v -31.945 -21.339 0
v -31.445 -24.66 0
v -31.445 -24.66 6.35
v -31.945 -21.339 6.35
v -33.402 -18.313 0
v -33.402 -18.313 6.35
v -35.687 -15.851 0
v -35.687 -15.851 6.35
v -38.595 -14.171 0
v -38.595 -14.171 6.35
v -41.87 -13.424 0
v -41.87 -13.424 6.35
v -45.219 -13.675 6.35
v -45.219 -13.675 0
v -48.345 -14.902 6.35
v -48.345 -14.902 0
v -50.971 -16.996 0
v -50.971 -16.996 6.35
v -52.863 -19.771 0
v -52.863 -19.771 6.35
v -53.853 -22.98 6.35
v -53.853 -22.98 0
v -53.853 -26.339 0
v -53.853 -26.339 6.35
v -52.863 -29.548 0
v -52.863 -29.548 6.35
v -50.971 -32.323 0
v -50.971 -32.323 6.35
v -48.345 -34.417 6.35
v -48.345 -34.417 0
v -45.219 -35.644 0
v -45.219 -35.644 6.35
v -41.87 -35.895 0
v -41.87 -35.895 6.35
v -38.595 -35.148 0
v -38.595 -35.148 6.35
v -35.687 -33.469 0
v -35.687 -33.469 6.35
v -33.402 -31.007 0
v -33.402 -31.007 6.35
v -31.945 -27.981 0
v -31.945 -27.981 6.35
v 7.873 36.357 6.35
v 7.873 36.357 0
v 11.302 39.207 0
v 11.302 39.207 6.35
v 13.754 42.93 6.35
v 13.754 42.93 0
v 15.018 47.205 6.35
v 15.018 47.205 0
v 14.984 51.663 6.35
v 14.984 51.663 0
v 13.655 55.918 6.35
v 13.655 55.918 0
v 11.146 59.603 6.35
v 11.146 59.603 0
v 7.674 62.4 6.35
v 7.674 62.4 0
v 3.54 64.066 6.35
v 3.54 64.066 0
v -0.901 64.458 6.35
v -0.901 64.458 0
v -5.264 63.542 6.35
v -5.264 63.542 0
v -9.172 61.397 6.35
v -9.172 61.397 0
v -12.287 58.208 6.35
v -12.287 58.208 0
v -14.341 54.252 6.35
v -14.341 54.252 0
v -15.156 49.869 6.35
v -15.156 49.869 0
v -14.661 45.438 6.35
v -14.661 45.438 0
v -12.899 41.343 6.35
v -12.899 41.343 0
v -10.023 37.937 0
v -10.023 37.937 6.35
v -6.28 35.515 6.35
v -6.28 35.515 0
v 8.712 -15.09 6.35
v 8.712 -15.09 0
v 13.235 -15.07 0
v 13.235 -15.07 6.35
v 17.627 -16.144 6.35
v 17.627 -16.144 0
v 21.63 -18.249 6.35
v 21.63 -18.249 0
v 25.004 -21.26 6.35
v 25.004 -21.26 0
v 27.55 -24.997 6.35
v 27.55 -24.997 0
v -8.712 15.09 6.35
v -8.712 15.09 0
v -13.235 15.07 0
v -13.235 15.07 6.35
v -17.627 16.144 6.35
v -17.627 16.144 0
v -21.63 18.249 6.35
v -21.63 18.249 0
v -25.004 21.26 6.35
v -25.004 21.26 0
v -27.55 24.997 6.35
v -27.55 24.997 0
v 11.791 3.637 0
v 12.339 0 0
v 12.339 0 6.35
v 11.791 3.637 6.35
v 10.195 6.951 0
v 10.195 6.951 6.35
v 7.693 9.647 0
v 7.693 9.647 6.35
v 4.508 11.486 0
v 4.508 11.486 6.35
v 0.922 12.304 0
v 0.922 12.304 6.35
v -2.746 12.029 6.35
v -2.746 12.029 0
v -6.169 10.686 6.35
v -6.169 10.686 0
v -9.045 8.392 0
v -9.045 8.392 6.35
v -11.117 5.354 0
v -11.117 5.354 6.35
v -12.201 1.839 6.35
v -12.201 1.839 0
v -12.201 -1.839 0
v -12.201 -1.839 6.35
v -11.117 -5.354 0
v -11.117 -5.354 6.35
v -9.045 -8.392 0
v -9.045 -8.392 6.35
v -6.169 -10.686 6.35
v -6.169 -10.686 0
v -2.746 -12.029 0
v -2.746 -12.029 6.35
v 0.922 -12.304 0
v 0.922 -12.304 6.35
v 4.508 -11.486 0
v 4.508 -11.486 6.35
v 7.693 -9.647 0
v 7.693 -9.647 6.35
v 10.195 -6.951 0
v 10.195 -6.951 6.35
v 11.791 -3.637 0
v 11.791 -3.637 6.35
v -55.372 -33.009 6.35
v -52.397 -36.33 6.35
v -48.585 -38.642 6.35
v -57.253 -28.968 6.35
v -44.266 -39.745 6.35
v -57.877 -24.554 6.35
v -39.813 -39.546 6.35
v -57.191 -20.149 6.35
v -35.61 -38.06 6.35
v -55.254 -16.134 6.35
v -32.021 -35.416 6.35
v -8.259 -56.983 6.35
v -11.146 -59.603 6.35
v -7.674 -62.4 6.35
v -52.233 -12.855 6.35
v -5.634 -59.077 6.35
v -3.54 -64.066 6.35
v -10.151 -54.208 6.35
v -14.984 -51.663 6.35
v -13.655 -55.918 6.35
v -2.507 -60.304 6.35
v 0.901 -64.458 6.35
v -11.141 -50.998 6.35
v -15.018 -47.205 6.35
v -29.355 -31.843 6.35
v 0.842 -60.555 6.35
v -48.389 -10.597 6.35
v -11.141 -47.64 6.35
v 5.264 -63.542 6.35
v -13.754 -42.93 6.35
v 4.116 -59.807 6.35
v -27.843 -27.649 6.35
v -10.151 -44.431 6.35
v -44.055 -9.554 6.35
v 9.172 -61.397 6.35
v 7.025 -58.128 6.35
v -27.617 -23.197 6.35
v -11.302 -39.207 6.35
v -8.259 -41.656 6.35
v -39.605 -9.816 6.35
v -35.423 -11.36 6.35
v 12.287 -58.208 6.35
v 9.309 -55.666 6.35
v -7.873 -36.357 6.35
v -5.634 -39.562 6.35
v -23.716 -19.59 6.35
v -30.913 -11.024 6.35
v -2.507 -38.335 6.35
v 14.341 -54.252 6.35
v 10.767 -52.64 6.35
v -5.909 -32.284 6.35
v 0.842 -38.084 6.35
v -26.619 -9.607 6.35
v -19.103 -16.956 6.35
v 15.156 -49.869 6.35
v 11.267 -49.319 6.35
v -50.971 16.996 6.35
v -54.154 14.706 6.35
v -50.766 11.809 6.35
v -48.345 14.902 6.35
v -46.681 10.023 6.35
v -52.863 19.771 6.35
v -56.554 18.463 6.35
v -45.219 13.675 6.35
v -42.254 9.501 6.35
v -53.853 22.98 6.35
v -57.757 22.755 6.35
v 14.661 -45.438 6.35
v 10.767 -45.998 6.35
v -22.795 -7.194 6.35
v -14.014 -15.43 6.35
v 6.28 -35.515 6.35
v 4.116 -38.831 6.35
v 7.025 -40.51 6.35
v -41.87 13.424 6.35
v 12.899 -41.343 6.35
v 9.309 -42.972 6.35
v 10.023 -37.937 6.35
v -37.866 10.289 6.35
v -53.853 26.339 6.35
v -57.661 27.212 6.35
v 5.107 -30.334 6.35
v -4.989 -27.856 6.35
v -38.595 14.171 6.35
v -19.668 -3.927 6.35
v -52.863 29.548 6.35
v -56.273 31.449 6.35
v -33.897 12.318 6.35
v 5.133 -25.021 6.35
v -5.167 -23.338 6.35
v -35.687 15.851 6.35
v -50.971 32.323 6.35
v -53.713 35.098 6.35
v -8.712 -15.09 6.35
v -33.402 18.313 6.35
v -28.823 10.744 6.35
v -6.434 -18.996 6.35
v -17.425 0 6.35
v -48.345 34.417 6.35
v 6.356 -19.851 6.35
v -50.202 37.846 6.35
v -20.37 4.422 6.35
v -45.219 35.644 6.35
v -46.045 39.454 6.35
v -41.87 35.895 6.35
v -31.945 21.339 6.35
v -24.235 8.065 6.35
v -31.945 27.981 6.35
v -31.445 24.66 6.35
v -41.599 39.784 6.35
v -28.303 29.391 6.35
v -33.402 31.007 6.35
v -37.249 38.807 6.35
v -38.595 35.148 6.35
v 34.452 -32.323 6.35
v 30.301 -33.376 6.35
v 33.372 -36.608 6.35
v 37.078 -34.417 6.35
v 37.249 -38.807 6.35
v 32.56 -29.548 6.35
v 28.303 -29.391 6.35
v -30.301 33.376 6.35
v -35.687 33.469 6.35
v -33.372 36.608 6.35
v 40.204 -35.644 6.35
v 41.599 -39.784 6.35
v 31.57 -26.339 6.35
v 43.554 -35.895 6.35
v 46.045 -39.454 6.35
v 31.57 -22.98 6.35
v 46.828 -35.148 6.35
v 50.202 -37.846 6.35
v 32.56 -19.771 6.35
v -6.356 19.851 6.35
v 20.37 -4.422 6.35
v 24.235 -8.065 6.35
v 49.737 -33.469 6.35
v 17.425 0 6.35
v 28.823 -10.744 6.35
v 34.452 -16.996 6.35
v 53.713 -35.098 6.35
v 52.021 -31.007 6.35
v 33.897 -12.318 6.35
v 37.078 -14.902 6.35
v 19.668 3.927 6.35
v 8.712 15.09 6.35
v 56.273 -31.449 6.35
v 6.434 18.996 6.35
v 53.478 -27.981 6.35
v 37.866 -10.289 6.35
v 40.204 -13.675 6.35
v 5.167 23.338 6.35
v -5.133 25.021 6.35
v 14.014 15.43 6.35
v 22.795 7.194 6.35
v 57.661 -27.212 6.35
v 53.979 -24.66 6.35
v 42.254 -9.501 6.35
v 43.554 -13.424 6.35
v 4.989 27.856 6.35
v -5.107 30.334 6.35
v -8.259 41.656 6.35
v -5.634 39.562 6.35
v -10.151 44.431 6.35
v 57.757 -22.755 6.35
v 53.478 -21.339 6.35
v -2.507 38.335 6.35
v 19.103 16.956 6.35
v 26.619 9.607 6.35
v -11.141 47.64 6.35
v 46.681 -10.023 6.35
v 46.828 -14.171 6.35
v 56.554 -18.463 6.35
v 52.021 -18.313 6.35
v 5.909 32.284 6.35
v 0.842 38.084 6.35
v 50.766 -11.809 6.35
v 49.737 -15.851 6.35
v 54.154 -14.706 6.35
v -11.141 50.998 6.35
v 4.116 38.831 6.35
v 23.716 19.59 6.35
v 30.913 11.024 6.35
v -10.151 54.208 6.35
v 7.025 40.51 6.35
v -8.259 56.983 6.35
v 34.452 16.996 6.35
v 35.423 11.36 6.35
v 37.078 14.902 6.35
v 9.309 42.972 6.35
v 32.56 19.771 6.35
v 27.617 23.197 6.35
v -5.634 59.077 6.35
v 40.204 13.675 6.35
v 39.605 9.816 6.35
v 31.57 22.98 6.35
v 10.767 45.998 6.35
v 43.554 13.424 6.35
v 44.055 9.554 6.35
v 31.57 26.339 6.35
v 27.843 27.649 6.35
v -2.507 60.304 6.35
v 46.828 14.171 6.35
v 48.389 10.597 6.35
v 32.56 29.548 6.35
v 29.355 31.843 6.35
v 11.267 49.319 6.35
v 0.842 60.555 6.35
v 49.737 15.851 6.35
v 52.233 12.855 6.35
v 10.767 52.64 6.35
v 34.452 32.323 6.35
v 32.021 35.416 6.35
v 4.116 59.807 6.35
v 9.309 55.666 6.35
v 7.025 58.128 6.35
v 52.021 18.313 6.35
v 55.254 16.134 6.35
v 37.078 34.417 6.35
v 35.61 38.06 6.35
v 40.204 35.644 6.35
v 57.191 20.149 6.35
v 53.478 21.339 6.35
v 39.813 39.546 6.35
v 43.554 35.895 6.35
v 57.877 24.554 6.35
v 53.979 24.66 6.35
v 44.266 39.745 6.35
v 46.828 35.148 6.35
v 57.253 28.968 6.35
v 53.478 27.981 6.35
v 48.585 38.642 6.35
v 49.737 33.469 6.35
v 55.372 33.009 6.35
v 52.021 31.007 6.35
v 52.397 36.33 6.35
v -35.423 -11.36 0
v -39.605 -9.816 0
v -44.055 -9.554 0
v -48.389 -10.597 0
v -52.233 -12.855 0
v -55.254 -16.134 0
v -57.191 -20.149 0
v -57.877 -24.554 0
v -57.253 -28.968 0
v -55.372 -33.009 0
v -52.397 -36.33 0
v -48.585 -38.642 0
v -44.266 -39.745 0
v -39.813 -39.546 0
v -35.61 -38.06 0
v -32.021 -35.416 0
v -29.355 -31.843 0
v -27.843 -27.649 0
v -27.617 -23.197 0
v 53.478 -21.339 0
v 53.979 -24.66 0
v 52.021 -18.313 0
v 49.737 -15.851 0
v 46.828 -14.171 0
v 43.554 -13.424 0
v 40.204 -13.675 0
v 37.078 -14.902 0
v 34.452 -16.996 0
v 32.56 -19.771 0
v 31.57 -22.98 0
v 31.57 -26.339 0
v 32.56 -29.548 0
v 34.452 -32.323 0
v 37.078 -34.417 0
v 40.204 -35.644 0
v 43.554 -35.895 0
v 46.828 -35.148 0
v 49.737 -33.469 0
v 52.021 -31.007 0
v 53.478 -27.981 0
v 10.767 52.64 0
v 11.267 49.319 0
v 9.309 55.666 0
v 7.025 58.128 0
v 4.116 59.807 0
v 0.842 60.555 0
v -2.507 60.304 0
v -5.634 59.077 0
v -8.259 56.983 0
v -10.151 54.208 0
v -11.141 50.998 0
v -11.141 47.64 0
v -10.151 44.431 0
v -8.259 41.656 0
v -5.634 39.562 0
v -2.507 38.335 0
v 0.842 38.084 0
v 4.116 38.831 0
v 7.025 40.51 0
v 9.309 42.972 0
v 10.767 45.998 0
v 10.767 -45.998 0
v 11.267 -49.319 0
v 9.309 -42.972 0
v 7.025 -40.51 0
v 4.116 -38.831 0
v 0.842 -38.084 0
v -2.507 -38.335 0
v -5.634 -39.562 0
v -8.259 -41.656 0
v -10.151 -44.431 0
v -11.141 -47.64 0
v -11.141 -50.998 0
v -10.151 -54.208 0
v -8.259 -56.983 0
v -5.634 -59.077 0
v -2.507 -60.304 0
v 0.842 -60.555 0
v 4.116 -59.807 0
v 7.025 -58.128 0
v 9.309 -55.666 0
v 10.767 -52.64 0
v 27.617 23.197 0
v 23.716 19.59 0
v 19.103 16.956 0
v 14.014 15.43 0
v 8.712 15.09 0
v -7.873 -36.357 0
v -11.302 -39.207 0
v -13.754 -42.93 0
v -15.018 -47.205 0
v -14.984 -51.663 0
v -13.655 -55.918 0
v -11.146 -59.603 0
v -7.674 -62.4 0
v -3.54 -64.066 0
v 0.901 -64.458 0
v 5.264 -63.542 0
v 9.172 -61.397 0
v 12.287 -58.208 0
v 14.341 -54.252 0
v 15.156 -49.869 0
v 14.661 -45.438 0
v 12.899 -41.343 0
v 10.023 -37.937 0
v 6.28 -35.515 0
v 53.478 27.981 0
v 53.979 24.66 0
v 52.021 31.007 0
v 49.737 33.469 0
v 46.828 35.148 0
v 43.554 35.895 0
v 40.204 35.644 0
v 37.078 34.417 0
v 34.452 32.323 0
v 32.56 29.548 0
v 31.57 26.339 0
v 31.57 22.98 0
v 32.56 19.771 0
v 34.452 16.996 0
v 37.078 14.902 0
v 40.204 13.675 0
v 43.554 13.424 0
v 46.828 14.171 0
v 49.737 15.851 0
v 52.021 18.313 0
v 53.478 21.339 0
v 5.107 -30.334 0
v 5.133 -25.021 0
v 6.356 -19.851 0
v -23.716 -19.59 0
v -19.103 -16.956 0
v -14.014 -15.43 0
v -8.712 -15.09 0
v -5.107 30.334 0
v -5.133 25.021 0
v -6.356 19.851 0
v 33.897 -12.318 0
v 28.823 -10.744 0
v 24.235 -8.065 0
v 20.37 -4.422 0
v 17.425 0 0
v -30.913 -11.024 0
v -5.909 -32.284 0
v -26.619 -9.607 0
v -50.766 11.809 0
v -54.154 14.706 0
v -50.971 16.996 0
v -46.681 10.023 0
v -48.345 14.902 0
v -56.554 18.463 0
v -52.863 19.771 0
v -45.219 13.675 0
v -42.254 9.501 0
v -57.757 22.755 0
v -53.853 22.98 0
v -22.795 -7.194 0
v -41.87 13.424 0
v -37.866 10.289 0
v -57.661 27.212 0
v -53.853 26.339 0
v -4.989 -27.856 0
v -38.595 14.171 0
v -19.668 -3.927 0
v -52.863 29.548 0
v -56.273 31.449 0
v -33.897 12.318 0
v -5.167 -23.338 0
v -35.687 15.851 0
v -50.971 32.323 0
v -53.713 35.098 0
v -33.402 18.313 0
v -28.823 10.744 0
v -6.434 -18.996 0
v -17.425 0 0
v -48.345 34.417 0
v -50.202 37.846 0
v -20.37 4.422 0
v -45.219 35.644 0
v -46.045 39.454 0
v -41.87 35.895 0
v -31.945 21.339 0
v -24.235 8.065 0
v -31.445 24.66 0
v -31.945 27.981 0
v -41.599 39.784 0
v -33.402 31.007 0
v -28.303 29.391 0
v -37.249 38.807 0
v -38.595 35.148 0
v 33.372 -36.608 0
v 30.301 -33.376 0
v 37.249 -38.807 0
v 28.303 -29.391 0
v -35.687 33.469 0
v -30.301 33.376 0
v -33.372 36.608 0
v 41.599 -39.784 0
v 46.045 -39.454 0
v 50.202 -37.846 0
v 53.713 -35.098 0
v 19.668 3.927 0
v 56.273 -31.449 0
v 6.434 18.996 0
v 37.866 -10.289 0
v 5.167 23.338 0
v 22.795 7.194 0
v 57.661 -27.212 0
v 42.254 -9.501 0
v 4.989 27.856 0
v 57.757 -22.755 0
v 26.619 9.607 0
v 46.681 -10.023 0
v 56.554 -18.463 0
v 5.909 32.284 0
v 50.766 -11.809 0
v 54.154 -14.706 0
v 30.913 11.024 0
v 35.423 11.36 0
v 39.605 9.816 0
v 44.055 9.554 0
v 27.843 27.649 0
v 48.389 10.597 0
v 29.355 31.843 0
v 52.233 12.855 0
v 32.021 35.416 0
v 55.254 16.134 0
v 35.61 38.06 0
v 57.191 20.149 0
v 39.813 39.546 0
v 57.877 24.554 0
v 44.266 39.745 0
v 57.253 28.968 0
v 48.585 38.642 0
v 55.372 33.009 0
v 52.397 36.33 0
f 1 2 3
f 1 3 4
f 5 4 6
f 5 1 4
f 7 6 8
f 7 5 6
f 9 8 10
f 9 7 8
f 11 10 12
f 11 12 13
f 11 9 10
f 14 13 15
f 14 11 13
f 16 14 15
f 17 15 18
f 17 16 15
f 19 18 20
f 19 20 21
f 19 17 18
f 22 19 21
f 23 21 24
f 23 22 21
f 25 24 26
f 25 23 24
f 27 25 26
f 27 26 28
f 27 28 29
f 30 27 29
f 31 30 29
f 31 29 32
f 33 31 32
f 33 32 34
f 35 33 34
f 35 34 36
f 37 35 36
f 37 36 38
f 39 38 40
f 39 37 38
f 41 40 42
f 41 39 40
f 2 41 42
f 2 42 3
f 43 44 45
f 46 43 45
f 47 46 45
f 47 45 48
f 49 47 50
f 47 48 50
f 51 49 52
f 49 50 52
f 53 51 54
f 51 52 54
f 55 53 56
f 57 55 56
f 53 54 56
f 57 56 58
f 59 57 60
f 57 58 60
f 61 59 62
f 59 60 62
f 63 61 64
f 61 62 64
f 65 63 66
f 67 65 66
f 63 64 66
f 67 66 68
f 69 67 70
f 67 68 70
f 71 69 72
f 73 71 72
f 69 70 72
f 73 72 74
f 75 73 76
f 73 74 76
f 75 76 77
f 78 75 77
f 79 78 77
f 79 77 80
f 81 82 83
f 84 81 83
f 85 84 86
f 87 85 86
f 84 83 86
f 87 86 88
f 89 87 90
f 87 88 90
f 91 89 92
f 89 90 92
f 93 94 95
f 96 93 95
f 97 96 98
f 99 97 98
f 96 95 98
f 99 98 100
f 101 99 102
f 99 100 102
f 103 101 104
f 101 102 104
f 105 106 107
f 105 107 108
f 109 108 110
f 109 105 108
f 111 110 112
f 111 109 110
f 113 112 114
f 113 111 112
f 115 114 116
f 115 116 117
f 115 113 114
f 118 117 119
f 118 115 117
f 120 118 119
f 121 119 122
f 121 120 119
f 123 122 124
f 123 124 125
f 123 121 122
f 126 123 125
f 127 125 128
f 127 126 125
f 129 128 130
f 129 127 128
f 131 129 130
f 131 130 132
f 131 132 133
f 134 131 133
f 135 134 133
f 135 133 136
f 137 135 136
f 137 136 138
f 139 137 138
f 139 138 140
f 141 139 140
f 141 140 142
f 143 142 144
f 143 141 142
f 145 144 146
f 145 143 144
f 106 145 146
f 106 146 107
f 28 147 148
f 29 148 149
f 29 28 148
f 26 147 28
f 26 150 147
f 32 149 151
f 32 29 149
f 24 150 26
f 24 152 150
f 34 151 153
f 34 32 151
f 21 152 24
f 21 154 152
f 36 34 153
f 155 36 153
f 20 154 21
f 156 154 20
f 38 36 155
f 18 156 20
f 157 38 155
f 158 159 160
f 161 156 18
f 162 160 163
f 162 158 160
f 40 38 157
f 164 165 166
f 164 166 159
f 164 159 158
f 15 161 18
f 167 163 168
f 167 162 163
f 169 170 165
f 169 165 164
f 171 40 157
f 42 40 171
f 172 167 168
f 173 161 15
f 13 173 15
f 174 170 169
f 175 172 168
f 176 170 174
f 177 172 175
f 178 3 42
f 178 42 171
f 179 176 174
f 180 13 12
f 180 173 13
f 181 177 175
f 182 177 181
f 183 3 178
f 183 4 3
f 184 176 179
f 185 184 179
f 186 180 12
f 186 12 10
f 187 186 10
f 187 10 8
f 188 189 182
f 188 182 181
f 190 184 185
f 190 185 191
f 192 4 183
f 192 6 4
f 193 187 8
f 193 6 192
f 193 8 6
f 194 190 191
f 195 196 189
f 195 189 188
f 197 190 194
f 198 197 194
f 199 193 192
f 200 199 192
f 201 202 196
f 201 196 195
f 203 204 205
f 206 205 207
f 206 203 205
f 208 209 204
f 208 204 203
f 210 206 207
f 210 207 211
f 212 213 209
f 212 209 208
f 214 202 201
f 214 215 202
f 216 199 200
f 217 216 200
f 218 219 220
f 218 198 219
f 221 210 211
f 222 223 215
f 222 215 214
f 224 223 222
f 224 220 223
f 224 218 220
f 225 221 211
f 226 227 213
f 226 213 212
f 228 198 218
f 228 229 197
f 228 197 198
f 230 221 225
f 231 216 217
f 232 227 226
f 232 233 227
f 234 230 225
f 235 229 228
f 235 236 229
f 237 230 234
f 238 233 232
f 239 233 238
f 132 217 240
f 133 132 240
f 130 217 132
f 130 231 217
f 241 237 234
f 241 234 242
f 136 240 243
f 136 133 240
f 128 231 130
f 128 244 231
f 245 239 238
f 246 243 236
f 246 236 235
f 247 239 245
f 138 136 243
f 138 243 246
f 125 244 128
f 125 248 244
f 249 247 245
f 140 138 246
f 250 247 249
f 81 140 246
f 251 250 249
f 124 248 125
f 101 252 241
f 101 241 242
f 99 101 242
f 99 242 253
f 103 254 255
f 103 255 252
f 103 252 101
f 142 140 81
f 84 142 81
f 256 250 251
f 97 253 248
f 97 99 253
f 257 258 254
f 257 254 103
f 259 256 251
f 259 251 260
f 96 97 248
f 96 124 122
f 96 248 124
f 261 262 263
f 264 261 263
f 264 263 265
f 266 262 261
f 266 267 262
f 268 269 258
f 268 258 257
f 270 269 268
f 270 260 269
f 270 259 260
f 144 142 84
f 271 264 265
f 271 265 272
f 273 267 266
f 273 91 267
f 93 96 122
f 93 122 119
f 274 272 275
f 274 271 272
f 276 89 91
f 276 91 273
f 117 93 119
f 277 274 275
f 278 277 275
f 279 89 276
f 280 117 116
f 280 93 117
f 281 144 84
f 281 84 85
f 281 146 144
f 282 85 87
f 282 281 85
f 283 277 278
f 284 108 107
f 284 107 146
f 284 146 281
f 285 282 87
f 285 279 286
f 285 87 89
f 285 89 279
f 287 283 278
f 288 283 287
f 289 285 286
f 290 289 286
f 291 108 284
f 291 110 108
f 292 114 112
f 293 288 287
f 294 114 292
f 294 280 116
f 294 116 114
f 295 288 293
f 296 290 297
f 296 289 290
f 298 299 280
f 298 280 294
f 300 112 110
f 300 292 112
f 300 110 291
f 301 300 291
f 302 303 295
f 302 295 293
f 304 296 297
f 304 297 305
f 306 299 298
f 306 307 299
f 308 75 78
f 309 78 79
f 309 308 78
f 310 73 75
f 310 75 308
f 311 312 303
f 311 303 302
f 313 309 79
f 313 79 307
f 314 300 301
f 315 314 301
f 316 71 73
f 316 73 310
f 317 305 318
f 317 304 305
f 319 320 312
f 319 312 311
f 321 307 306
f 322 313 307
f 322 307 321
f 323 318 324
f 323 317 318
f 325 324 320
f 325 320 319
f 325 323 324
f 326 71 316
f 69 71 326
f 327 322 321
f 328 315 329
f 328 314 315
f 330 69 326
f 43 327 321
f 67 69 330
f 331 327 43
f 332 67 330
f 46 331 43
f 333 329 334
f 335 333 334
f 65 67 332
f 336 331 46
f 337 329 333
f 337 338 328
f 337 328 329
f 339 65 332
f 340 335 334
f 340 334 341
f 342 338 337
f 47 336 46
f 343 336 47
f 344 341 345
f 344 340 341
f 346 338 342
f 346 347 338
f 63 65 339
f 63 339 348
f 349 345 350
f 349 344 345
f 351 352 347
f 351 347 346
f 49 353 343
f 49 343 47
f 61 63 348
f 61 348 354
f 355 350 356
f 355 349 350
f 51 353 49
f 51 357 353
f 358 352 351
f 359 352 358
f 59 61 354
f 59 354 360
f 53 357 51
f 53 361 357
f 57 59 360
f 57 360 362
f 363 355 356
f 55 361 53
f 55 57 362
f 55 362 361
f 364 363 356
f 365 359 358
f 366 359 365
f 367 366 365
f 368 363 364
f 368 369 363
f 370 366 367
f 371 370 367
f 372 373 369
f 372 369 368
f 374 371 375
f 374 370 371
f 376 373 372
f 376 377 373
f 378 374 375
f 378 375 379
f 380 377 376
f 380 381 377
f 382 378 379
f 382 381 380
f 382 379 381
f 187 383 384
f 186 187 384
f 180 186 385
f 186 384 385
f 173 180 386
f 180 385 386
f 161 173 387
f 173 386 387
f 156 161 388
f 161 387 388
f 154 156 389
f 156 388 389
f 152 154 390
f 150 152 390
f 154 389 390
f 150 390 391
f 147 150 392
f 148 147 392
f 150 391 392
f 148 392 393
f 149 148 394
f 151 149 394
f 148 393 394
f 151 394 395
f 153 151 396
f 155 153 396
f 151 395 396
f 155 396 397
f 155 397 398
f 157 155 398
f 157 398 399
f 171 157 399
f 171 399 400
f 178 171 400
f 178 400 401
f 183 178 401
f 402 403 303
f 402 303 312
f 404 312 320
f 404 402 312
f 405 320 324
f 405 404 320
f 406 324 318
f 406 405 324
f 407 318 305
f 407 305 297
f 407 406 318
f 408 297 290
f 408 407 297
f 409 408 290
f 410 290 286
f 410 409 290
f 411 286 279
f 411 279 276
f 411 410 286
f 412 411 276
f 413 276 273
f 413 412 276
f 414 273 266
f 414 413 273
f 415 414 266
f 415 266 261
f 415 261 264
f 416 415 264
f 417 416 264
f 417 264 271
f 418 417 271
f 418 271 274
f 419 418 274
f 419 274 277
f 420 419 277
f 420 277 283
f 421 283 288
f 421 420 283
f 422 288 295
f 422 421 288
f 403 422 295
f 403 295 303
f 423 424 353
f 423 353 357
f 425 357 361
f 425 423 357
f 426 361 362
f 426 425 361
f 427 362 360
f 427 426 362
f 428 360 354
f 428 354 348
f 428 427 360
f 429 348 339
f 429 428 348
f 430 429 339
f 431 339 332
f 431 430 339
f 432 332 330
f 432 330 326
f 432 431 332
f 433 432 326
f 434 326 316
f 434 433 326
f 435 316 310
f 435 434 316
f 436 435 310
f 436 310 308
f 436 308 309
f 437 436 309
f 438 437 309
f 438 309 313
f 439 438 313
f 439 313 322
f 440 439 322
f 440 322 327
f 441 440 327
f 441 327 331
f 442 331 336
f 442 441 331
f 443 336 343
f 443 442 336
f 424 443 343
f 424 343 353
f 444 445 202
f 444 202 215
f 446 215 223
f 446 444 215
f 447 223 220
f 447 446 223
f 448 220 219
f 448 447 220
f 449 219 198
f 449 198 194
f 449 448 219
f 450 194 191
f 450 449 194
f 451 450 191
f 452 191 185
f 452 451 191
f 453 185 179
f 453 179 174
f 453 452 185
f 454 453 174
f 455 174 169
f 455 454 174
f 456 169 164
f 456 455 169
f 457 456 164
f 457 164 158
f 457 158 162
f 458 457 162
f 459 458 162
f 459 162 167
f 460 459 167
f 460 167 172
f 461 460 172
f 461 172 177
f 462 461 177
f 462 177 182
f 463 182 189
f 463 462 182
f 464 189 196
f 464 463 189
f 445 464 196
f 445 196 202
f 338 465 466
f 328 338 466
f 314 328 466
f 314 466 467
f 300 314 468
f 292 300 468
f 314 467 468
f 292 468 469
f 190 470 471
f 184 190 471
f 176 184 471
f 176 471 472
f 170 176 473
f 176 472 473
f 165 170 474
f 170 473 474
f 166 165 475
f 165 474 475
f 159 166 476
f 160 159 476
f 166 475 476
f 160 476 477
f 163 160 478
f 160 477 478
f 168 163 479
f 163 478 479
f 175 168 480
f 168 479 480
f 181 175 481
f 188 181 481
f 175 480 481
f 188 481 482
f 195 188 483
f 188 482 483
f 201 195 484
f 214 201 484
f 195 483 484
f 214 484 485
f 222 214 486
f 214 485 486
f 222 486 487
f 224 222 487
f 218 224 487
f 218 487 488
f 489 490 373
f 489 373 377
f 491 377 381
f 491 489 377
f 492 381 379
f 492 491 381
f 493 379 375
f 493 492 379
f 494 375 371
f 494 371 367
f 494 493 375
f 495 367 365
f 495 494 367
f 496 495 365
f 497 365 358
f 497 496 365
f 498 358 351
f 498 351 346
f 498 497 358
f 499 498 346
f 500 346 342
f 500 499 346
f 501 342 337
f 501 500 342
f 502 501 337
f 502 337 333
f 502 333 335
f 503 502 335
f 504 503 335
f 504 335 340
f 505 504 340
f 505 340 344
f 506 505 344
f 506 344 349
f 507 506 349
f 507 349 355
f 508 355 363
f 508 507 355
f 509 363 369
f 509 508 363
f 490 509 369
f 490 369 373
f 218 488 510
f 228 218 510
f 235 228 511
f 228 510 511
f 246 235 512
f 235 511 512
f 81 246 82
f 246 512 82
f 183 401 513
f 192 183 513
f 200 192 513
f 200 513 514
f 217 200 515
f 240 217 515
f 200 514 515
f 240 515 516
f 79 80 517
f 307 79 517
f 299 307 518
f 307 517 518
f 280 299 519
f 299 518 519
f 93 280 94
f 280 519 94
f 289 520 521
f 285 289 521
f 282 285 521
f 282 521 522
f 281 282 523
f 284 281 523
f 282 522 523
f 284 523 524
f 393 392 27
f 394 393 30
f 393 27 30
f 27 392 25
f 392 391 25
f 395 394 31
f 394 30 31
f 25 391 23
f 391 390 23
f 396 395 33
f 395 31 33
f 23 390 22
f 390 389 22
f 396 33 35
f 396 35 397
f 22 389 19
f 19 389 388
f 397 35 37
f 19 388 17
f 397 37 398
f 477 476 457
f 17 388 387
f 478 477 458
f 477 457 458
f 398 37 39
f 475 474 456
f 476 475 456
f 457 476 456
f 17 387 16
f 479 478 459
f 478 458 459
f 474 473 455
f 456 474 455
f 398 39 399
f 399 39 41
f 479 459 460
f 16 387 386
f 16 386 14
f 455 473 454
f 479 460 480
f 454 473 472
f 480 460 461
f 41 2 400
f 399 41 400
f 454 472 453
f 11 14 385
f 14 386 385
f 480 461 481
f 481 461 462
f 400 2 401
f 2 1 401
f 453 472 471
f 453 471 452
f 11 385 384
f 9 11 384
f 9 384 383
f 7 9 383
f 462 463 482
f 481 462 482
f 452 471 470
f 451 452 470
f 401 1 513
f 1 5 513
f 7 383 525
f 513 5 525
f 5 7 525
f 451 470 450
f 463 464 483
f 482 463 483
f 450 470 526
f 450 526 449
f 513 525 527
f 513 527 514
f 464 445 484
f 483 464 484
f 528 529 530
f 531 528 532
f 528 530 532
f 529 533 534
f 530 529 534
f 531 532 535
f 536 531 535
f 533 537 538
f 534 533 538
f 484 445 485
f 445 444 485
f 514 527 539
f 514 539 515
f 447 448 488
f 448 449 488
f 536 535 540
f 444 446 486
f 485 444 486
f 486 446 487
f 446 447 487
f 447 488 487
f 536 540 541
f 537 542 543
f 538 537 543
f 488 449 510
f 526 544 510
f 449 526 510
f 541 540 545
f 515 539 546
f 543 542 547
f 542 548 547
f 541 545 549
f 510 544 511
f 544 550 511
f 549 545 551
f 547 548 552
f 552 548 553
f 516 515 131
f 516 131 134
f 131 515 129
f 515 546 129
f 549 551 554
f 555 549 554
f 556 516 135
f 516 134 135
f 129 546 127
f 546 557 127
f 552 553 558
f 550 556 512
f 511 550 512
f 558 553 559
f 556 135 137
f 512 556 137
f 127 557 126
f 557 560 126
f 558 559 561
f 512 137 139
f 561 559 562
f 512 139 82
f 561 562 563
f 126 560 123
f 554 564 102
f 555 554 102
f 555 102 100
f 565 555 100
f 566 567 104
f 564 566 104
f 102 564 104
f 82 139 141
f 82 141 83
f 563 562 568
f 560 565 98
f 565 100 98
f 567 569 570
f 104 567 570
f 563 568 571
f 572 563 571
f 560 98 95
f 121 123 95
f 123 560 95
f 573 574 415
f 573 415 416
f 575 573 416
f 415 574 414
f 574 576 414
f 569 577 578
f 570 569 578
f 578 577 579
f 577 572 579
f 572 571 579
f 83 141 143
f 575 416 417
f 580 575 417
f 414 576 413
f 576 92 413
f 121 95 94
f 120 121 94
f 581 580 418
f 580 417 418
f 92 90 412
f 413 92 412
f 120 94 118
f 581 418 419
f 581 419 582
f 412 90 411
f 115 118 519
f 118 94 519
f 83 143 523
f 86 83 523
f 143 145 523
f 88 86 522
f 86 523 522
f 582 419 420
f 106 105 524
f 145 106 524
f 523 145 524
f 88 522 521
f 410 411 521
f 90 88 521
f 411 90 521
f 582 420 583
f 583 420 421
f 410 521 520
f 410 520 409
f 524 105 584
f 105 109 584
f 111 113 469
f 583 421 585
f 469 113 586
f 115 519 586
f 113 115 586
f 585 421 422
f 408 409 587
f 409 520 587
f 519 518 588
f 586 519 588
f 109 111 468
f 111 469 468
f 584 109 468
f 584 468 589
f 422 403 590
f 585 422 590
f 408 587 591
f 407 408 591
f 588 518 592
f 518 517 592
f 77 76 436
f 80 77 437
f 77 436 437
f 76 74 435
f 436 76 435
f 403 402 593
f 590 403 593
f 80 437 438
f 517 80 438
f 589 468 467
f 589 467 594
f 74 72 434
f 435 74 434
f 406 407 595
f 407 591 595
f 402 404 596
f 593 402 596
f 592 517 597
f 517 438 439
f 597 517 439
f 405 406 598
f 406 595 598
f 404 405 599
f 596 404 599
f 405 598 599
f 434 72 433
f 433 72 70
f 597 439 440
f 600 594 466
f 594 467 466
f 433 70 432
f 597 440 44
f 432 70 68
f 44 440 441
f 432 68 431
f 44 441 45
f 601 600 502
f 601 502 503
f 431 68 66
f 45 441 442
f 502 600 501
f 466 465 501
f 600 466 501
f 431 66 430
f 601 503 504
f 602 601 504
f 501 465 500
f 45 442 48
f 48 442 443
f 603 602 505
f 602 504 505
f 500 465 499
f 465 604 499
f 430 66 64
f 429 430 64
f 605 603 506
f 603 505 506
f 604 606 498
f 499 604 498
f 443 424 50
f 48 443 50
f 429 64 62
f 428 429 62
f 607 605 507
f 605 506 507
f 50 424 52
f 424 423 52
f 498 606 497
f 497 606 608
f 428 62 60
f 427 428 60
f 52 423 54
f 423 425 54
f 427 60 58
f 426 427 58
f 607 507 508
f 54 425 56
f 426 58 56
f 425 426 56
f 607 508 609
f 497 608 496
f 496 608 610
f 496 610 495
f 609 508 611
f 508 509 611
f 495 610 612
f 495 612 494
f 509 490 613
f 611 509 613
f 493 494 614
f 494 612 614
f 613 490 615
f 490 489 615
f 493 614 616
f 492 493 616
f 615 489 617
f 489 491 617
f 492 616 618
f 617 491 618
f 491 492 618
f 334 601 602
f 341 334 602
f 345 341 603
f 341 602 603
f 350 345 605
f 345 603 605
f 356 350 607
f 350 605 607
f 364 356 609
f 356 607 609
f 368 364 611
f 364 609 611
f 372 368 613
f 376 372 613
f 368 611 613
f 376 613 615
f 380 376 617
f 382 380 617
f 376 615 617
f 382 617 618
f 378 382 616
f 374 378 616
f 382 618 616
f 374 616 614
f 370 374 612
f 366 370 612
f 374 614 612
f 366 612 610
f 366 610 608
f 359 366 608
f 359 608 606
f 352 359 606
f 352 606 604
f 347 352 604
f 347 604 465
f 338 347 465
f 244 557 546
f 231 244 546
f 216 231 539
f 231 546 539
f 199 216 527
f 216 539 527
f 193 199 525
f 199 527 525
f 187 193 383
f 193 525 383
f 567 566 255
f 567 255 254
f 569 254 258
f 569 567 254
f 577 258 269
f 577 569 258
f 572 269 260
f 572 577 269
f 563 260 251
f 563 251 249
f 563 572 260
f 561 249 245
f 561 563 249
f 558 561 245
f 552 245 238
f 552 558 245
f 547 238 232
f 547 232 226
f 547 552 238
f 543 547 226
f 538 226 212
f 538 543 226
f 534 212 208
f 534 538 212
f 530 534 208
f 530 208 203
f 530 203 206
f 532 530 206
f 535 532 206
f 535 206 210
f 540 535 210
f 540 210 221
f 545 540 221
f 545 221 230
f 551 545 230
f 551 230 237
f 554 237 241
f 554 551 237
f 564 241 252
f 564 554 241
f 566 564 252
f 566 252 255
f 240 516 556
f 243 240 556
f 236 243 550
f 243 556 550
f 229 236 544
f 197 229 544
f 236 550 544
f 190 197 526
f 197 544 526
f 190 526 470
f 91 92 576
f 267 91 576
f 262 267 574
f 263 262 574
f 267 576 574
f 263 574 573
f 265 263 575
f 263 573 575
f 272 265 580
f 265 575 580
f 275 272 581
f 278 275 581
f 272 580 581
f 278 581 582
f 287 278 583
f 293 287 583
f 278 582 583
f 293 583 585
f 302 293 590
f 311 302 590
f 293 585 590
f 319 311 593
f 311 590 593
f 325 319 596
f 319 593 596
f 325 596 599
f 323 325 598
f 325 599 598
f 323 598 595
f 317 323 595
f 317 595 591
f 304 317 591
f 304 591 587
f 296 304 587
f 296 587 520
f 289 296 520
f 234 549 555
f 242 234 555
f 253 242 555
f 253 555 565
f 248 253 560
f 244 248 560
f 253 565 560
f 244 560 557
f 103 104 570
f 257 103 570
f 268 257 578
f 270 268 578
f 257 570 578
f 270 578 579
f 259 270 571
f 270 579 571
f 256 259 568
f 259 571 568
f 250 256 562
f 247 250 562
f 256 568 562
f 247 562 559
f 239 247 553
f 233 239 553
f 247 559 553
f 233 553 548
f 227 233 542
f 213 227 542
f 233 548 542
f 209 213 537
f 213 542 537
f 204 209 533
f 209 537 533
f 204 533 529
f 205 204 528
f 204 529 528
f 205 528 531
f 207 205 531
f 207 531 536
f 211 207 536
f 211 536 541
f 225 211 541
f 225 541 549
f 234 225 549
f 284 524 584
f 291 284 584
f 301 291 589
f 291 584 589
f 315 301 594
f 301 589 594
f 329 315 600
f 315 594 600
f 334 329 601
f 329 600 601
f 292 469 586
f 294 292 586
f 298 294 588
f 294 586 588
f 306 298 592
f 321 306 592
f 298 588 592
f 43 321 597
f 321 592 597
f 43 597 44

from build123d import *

# Parameters (mm, degrees)
F0_R     = 11.267098278
F0_R_2   = 12.3387041608
F1_DEPTH = 6.35


with BuildPart() as f1:
    # F0 (on Top) → F1 (new body)
    with BuildSketch(Plane.XY):
        with BuildLine():
            ThreePointArc((8.7123179944, 15.0903645105), (4.9401614153, 25.5916315175), (7.8734188263, 36.3574001836))
            ThreePointArc((7.8734188263, 36.3574001836), (-0.9009997096, 64.4580259045), (-6.2804322517, 35.5150251603))
            ThreePointArc((-6.2804322517, 35.5150251603), (-5.1328327, 25.0212030543), (-8.7124800213, 15.0902709642))
            ThreePointArc((-8.7124800213, 15.0902709642), (-19.6929223108, 17.0741210432), (-27.5497227614, 24.99728081))
            ThreePointArc((-27.5497227614, 24.99728081), (-56.2727877659, 31.4487243149), (-33.8971301307, 12.3184987035))
            ThreePointArc((-33.8971301307, 12.3184987035), (-24.2354138283, 8.0654380156), (-17.4247980157, -9.35463e-05))
            ThreePointArc((-17.4247980157, -9.35463e-05), (-24.6330837261, -8.5175104743), (-35.4231415877, -11.3601193736))
            ThreePointArc((-35.4231415877, -11.3601193736), (-55.3717880563, -33.0093015896), (-27.6166978791, -23.1965264569))
            ThreePointArc((-27.6166978791, -23.1965264569), (-19.1025811283, -16.9557650387), (-8.7123179944, -15.0903645105))
            ThreePointArc((-8.7123179944, -15.0903645105), (-4.9401614153, -25.5916315175), (-7.8734188263, -36.3574001836))
            ThreePointArc((-7.8734188263, -36.3574001836), (0.9009997096, -64.4580259045), (6.2804322517, -35.5150251603))
            ThreePointArc((6.2804322517, -35.5150251603), (5.1328327, -25.0212030543), (8.7124800213, -15.0902709642))
            ThreePointArc((8.7124800213, -15.0902709642), (19.6929223108, -17.0741210432), (27.5497227614, -24.99728081))
            ThreePointArc((27.5497227614, -24.99728081), (56.2727877659, -31.4487243149), (33.8971301307, -12.3184987035))
            ThreePointArc((33.8971301307, -12.3184987035), (24.2354138283, -8.0654380156), (17.4247980157, 9.35463e-05))
            ThreePointArc((17.4247980157, 9.35463e-05), (24.6330837261, 8.5175104743), (35.4231415877, 11.3601193736))
            ThreePointArc((35.4231415877, 11.3601193736), (55.3717880563, 33.0093015896), (27.6166978791, 23.1965264569))
            ThreePointArc((27.6166978791, 23.1965264569), (19.1025811283, 16.9557650387), (8.7123179944, 15.0903645105))
        make_face()
        with Locations((-42.7116318899, -24.6595721692)):
            Circle(F0_R, mode=Mode.SUBTRACT)
        with BuildLine():
            ThreePointArc((-8.3770879832, -15.1094843982), (-8.5446687054, -15.0993233615), (-8.7123179944, -15.0903645105))
            ThreePointArc((-8.7123179944, -15.0903645105), (-8.8358376955, -14.9298053557), (-8.9611030536, -14.7706043858))
            ThreePointArc((-8.9611030536, -14.7706043858), (-8.6707512375, -14.9428978058), (-8.3770879832, -15.1094843982))
        make_face(mode=Mode.SUBTRACT)
        with Locations((0, -49.3191443384)):
            Circle(F0_R, mode=Mode.SUBTRACT)
        with BuildLine():
            ThreePointArc((8.8966533354, -14.8095132023), (8.8040632583, -14.9495618465), (8.7124800213, -15.0902709642))
            ThreePointArc((8.7124800213, -15.0902709642), (8.5116718638, -15.1169625859), (8.3111671005, -15.1458450832))
            ThreePointArc((8.3111671005, -15.1458450832), (8.6055534873, -14.9805397445), (8.8966533354, -14.8095132023))
        make_face(mode=Mode.SUBTRACT)
        with BuildLine():
            ThreePointArc((17.2737413186, 0.2999711959), (17.3487319637, 0.149761515), (17.4247980157, 9.35463e-05))
            ThreePointArc((17.4247980157, 9.35463e-05), (17.3475095593, -0.1871572302), (17.2722701541, -0.3752406974))
            ThreePointArc((17.2722701541, -0.3752406974), (17.2763047248, -0.0376419387), (17.2737413186, 0.2999711959))
        make_face(mode=Mode.SUBTRACT)
        with Locations((42.7116318899, -24.6595721692)):
            Circle(F0_R, mode=Mode.SUBTRACT)
        with Locations((-42.7116318899, 24.6595721692)):
            Circle(F0_R, mode=Mode.SUBTRACT)
        with BuildLine():
            ThreePointArc((-17.2737413186, -0.2999711959), (-17.3487319637, -0.149761515), (-17.4247980157, -9.35463e-05))
            ThreePointArc((-17.4247980157, -9.35463e-05), (-17.3475095593, 0.1871572302), (-17.2722701541, 0.3752406974))
            ThreePointArc((-17.2722701541, 0.3752406974), (-17.2763047248, 0.0376419387), (-17.2737413186, -0.2999711959))
        make_face(mode=Mode.SUBTRACT)
        Circle(F0_R_2, mode=Mode.SUBTRACT)
        with Locations((42.7116318899, 24.6595721692)):
            Circle(F0_R, mode=Mode.SUBTRACT)
        with Locations((0, 49.3191443384)):
            Circle(F0_R, mode=Mode.SUBTRACT)
        with BuildLine():
            ThreePointArc((-17.2722701541, 0.3752406974), (-17.3475095593, 0.1871572302), (-17.4247980157, -9.35463e-05))
            ThreePointArc((-17.4247980157, -9.35463e-05), (-17.3487319637, -0.149761515), (-17.2737413186, -0.2999711959))
            ThreePointArc((-17.2737413186, -0.2999711959), (-17.2763047248, 0.0376419387), (-17.2722701541, 0.3752406974))
        make_face()
        with BuildLine():
            ThreePointArc((-8.9611030536, -14.7706043858), (-8.8358376955, -14.9298053557), (-8.7123179944, -15.0903645105))
            ThreePointArc((-8.7123179944, -15.0903645105), (-8.5446687054, -15.0993233615), (-8.3770879832, -15.1094843982))
            ThreePointArc((-8.3770879832, -15.1094843982), (-8.6707512375, -14.9428978058), (-8.9611030536, -14.7706043858))
        make_face()
        with BuildLine():
            ThreePointArc((8.3111671005, -15.1458450832), (8.5116718638, -15.1169625859), (8.7124800213, -15.0902709642))
            ThreePointArc((8.7124800213, -15.0902709642), (8.8040632583, -14.9495618465), (8.8966533354, -14.8095132023))
            ThreePointArc((8.8966533354, -14.8095132023), (8.6055534873, -14.9805397445), (8.3111671005, -15.1458450832))
        make_face()
        with BuildLine():
            ThreePointArc((17.2722701541, -0.3752406974), (17.3475095593, -0.1871572302), (17.4247980157, 9.35463e-05))
            ThreePointArc((17.4247980157, 9.35463e-05), (17.3487319637, 0.149761515), (17.2737413186, 0.2999711959))
            ThreePointArc((17.2737413186, 0.2999711959), (17.2763047248, -0.0376419387), (17.2722701541, -0.3752406974))
        make_face()
    extrude(amount=F1_DEPTH)


solid = f1.part
